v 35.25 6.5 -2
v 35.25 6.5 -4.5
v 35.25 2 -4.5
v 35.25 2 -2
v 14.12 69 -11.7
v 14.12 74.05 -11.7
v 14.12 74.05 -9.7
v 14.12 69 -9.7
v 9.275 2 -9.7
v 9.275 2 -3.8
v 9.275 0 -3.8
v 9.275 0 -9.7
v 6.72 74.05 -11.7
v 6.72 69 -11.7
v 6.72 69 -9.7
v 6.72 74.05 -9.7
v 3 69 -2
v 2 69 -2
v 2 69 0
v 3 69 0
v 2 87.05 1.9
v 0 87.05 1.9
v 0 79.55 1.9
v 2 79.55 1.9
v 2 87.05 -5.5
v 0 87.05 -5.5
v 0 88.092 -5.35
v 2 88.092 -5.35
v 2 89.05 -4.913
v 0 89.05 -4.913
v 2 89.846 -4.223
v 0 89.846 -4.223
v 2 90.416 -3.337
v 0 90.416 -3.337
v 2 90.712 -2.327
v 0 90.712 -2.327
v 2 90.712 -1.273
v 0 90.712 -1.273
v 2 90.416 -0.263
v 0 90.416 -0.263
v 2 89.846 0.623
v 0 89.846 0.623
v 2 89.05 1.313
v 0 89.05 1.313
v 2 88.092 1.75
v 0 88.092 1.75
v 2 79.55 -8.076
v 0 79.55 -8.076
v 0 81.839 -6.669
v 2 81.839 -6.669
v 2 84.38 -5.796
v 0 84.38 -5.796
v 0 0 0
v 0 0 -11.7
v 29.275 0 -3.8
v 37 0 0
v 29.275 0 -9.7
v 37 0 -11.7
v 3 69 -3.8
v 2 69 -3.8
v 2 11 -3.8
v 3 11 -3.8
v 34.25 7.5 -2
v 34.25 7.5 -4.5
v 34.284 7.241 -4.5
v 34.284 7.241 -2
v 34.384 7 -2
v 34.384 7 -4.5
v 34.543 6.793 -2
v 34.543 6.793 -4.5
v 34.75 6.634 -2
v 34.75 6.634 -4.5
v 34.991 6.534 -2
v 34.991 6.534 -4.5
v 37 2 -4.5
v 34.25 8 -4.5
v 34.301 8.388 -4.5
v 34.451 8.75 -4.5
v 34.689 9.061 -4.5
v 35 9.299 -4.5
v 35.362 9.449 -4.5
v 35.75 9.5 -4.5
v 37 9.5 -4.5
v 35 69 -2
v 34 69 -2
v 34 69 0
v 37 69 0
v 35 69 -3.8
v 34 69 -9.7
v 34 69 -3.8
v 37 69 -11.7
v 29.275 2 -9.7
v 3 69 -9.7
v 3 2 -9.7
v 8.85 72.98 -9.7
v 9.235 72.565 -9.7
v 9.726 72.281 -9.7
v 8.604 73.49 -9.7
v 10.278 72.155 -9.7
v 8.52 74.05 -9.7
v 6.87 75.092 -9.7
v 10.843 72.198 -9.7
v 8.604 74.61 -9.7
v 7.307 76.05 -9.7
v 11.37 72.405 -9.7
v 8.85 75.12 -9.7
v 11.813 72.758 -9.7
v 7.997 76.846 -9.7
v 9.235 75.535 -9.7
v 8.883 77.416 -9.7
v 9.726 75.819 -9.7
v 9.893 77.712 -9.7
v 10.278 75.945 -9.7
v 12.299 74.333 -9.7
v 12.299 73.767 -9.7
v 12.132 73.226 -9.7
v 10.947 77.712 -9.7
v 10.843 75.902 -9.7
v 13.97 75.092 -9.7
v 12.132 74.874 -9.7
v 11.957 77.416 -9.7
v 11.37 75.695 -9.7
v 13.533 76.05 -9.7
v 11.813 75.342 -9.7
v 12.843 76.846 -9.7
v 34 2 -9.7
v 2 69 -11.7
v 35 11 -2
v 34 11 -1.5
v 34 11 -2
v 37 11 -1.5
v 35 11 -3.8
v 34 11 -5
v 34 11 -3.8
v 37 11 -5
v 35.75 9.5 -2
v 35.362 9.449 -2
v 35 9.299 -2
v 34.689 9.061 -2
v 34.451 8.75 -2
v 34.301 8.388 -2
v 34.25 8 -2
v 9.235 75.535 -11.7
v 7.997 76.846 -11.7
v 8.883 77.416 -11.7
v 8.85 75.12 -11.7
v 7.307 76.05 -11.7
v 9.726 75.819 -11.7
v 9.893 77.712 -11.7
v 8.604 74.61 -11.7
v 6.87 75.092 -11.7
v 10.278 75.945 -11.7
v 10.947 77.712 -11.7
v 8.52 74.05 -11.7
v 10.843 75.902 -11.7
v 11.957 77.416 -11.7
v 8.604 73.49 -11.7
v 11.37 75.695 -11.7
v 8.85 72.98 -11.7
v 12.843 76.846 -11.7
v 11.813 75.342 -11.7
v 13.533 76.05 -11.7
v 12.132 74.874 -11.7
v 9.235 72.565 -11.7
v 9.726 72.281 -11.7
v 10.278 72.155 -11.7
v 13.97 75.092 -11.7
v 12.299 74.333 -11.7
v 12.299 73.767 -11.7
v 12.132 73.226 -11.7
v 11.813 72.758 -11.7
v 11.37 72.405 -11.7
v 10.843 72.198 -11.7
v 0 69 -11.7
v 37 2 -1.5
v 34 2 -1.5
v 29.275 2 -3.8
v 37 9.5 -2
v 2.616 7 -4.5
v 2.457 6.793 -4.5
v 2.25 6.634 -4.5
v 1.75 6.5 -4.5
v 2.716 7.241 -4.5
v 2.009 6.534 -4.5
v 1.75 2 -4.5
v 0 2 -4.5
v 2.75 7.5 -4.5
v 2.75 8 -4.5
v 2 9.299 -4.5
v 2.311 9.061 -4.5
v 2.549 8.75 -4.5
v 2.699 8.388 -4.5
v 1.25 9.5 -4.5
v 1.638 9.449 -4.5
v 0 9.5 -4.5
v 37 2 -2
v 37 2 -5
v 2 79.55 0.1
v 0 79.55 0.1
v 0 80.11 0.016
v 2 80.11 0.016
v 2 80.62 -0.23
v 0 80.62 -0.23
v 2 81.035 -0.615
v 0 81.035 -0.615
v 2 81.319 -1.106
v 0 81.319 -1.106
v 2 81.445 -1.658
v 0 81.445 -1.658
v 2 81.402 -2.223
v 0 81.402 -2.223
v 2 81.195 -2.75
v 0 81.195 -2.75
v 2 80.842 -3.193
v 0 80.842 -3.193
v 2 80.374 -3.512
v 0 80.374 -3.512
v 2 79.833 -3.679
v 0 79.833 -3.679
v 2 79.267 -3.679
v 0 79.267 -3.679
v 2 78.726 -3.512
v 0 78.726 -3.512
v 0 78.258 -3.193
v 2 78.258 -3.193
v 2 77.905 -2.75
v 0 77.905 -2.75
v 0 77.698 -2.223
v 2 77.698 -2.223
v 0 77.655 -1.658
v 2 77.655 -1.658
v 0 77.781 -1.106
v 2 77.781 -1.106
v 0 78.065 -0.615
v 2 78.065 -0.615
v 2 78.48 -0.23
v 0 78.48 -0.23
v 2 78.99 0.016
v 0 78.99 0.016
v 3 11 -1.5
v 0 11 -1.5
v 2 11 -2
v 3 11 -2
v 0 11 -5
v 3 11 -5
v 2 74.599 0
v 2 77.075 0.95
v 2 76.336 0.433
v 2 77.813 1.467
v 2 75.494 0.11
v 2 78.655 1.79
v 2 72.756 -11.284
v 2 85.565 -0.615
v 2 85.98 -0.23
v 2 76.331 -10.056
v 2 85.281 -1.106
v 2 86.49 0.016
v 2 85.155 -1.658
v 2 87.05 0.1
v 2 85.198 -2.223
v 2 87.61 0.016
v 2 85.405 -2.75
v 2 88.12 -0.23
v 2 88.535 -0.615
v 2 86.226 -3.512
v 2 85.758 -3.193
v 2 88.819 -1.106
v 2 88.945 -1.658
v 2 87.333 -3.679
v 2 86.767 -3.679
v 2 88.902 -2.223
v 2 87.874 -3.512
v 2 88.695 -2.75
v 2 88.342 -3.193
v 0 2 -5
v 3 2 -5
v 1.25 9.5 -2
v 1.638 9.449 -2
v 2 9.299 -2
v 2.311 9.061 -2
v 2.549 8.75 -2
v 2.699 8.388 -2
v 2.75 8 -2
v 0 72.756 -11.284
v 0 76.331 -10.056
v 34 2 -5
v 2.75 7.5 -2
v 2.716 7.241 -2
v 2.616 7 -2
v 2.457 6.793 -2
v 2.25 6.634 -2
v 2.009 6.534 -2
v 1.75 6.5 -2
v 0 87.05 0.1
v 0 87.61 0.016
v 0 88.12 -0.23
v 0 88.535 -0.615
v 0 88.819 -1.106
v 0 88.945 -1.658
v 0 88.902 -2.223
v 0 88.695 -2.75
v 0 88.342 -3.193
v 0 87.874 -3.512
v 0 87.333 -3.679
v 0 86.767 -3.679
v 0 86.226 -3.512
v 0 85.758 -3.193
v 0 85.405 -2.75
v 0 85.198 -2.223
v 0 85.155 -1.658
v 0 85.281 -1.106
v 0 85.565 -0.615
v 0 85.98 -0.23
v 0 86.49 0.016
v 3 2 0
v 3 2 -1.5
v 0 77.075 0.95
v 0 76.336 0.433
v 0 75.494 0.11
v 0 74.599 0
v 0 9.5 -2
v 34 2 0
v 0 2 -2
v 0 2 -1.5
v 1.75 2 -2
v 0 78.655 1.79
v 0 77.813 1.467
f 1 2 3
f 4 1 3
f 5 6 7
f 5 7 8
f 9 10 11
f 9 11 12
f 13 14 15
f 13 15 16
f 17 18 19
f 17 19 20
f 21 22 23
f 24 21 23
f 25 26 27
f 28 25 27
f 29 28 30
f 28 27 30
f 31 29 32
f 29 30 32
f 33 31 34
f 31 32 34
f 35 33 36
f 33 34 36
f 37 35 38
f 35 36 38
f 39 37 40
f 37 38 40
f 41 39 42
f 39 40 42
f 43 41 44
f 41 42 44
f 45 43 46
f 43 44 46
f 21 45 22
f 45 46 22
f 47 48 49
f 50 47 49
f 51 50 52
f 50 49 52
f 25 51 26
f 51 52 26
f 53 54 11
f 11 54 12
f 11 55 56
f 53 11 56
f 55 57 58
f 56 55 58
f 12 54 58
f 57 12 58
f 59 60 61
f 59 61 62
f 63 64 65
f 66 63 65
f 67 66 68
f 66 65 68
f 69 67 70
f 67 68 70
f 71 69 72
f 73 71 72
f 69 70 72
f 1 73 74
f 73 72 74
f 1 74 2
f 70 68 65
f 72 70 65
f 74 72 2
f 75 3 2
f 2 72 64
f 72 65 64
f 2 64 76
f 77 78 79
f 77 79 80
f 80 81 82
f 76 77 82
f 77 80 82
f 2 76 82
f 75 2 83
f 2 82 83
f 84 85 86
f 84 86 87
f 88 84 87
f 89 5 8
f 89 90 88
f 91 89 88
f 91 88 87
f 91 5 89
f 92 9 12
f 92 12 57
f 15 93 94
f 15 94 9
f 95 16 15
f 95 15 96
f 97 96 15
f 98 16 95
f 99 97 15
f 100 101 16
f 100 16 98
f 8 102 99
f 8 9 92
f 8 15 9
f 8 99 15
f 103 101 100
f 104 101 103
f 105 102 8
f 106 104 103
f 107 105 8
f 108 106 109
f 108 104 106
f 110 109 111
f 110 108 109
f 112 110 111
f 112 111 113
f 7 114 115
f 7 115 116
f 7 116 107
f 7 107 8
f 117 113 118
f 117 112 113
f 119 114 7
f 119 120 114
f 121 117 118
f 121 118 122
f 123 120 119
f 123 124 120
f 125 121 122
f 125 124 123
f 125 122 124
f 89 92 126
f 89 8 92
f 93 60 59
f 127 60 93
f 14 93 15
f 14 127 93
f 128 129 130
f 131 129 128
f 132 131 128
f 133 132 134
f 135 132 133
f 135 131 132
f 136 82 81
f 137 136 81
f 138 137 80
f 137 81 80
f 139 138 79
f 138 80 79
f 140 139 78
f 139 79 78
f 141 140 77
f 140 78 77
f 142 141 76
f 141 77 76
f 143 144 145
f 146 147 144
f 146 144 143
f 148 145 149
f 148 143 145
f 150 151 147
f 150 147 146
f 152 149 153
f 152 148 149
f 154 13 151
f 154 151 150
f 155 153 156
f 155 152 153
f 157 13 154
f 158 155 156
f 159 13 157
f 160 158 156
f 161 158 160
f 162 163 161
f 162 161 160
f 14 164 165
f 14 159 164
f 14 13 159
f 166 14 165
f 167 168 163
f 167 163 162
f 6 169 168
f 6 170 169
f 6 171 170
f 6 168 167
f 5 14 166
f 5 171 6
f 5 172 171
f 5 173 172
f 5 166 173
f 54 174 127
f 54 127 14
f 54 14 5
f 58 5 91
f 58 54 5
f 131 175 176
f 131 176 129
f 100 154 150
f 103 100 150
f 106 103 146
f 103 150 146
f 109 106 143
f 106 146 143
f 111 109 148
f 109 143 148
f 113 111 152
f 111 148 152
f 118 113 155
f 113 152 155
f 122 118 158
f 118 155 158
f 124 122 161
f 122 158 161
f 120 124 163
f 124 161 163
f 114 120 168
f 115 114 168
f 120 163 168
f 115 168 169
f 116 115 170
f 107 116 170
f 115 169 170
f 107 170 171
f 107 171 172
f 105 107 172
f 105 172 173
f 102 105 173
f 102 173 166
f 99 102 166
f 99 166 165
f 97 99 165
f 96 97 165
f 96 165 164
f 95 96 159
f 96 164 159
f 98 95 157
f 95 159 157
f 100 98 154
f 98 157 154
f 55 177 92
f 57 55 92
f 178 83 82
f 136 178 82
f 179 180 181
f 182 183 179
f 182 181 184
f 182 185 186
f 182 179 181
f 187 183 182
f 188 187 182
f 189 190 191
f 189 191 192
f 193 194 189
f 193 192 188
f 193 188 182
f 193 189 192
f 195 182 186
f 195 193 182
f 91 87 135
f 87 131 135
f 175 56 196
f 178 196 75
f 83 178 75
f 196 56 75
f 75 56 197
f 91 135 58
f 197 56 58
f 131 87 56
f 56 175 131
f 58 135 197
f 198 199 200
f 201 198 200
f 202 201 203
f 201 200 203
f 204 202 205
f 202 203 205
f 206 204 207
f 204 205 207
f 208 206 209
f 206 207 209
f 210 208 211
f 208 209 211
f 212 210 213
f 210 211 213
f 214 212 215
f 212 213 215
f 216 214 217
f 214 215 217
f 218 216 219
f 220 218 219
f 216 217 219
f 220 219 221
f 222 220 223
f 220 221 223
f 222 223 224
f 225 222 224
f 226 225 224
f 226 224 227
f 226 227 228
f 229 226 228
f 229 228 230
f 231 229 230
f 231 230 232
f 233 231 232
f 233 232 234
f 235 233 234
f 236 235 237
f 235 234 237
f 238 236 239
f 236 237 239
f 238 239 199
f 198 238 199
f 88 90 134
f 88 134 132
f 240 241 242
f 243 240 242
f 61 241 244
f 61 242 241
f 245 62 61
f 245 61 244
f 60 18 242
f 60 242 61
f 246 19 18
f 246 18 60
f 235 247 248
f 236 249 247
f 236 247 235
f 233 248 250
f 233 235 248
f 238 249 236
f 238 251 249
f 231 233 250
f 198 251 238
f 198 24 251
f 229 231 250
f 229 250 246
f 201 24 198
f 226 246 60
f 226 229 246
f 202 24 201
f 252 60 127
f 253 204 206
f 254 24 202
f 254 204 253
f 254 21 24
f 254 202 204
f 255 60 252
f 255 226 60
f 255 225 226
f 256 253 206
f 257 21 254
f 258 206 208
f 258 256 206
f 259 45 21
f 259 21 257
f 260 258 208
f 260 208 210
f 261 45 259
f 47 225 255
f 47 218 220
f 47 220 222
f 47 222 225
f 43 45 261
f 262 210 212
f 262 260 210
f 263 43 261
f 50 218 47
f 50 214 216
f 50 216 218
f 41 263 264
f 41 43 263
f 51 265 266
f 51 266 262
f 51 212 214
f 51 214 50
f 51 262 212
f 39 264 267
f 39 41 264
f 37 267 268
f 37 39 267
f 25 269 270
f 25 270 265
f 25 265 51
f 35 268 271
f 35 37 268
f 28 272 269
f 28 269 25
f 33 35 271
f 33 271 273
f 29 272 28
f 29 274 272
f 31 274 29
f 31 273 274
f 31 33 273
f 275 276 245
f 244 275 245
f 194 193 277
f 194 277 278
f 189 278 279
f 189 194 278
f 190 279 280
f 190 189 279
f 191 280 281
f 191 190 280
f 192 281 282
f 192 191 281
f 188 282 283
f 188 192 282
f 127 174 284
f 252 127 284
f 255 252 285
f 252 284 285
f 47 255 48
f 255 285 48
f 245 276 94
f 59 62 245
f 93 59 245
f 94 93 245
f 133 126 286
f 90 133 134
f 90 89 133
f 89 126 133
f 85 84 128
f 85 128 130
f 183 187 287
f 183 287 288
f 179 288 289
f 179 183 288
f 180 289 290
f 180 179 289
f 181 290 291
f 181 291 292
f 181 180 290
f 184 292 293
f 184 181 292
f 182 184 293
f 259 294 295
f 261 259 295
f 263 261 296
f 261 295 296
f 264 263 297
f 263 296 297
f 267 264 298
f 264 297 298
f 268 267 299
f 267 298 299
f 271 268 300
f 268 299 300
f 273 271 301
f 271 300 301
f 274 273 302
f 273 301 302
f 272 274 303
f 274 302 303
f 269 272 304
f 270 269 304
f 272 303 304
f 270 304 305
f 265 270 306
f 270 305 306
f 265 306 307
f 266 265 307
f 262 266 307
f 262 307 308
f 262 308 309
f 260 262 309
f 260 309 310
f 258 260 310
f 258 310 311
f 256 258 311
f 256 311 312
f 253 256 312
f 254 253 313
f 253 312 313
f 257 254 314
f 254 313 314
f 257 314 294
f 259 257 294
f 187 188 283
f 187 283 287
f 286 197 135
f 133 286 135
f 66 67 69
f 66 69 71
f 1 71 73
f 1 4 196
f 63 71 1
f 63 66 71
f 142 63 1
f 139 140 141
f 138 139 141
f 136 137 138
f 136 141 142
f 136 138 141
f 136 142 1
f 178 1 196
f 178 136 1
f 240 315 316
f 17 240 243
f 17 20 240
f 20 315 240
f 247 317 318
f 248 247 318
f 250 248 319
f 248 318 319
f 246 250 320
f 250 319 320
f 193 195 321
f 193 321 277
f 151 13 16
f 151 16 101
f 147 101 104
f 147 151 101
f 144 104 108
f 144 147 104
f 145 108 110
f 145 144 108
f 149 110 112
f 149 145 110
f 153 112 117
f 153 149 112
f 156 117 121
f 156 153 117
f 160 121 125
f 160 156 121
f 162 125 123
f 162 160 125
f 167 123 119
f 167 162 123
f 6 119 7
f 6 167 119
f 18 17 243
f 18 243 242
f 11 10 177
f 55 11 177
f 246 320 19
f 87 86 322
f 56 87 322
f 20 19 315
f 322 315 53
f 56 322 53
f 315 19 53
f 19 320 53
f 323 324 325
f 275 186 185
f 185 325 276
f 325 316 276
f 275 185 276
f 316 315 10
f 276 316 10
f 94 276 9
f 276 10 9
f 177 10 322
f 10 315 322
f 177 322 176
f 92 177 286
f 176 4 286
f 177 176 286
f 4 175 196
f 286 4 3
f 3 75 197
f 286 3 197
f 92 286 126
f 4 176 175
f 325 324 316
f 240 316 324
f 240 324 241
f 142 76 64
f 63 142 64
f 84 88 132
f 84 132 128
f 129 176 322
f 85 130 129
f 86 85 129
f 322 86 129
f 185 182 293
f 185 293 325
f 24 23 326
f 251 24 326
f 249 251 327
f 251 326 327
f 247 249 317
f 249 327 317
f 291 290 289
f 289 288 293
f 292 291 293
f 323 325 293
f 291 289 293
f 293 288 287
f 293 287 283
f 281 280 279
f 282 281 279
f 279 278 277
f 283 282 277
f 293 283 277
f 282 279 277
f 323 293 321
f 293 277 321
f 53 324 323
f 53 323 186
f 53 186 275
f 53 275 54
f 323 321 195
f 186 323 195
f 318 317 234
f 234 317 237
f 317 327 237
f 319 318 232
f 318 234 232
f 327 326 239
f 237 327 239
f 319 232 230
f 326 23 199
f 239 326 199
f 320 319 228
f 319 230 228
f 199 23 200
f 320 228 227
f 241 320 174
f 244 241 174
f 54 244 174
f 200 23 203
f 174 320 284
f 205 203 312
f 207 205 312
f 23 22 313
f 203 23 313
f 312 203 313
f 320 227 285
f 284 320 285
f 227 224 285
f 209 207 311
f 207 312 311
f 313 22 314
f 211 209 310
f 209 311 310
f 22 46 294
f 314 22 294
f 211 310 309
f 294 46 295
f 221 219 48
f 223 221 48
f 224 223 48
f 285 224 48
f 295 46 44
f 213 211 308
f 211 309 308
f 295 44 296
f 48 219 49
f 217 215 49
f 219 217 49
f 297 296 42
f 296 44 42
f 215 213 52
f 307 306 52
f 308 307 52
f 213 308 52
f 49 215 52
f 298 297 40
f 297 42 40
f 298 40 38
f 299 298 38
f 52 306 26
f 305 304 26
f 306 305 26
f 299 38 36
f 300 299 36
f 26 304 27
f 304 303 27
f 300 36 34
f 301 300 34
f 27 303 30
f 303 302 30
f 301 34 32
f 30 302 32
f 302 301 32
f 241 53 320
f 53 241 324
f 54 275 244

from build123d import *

# Parameters (mm, degrees)
SKETCH1_W           = 37
SKETCH1_H           = 11.7
BOSS_EXTRUDE1_DEPTH = 69
CUT_EXTRUDE1_DEPTH  = 67
SKETCH3_W           = 20
SKETCH3_H           = 5.9
CUT_EXTRUDE2_DEPTH  = 67
SKETCH5_R           = 1.9
BOSS_EXTRUDE3_DEPTH = 2
SKETCH7_R           = 1.9
BOSS_EXTRUDE4_DEPTH = 2
SKETCH8_W           = 3.5
SKETCH8_H           = 9
CUT_EXTRUDE3_DEPTH  = 40
BOSS_EXTRUDE5_START = 0.5
BOSS_EXTRUDE5_DEPTH = 2.5


with BuildPart() as part:
    # Sketch1 → Boss-Extrude1 (new body)
    with BuildSketch(Plane(origin=(0, 0, 0), x_dir=(1, 0, 0), z_dir=(0, 1, 0))):
        with Locations((18.5, 5.85)):
            Rectangle(SKETCH1_W, SKETCH1_H)
    extrude(amount=BOSS_EXTRUDE1_DEPTH)

    # Sketch2 → Cut-Extrude1 (cut)
    with BuildSketch(Plane(origin=(0, 69, 0), x_dir=(1, 0, 0), z_dir=(0, 1, 0))):
        Polygon((3, 0), (3, 2), (2, 2), (2, 3.8), (3, 3.8), (3, 9.7), (34, 9.7), (34, 3.8), (35, 3.8), (35, 2), (34, 2), (34, 0), align=None)
    extrude(amount=-CUT_EXTRUDE1_DEPTH, mode=Mode.SUBTRACT)

    # Sketch3 → Cut-Extrude2 (cut)
    with BuildSketch(Plane(origin=(0, 2, 0), x_dir=(1, 0, 0), z_dir=(0, 1, 0))):
        with Locations((19.275, 6.75)):
            Rectangle(SKETCH3_W, SKETCH3_H)
    extrude(amount=-CUT_EXTRUDE2_DEPTH, mode=Mode.SUBTRACT)

    # Sketch5 → Boss-Extrude3 (add)
    with BuildSketch(Plane(origin=(0, 0, -11.7), x_dir=(-1, 0, 0), z_dir=(0, 0, -1))):
        with BuildLine():
            Line((-14.12, 74.05), (-14.12, 69))
            Line((-14.12, 69), (-6.72, 69))
            Line((-6.72, 69), (-6.72, 74.05))
            ThreePointArc((-6.72, 74.05), (-10.42, 77.75), (-14.12, 74.05))
        make_face()
        with Locations((-10.42, 74.05)):
            Circle(SKETCH5_R, mode=Mode.SUBTRACT)
    extrude(amount=-BOSS_EXTRUDE3_DEPTH)

    # Sketch7 → Boss-Extrude4 (add)
    with BuildSketch(Plane.ZY):
        with BuildLine():
            Line((1.9, 87.05), (1.9, 79.55))
            ThreePointArc((1.9, 79.55), (1.65434509, 78.224292642), (0.95, 77.074621241))
            ThreePointArc((0.95, 77.074621241), (0.24565491, 75.924949841), (0, 74.599242482))
            Line((0, 74.599242482), (0, 69))
            Line((0, 69), (-11.7, 69))
            ThreePointArc((-11.7, 69), (-10.768790899, 74.577512686), (-8.076177285, 79.55))
            ThreePointArc((-8.076177285, 79.55), (-6.161996991, 83.084943588), (-5.5, 87.05))
            ThreePointArc((-5.5, 87.05), (-1.8, 90.75), (1.9, 87.05))
        make_face()
        with Locations((-1.8, 79.55)):
            Circle(SKETCH7_R, mode=Mode.SUBTRACT)
        with Locations((-1.8, 87.05)):
            Circle(SKETCH7_R, mode=Mode.SUBTRACT)
    extrude(amount=-BOSS_EXTRUDE4_DEPTH)

    # Sketch8 → Cut-Extrude3 (cut)
    with BuildSketch(Plane(origin=(37, 0, 0), x_dir=(0, 0, -1), z_dir=(1, 0, 0))):
        with Locations((3.25, 6.5)):
            Rectangle(SKETCH8_W, SKETCH8_H)
    extrude(amount=-CUT_EXTRUDE3_DEPTH, mode=Mode.SUBTRACT)

    # Sketch9 → Boss-Extrude5 (add)
    with BuildSketch(Plane.XY.offset(-5).offset(BOSS_EXTRUDE5_START)):
        with BuildLine():
            Line((37, 2), (37, 9.5))
            Line((37, 9.5), (35.75, 9.5))
            ThreePointArc((35.75, 9.5), (34.689339828, 9.060660172), (34.25, 8))
            Line((34.25, 8), (34.25, 7.5))
            ThreePointArc((34.25, 7.5), (34.542893219, 6.792893219), (35.25, 6.5))
            Line((35.25, 6.5), (35.25, 2))
            Line((35.25, 2), (37, 2))
        make_face()
    boss_extrude5 = extrude(amount=BOSS_EXTRUDE5_DEPTH)

    # Mirror1: Boss-Extrude5 across plane
    add(boss_extrude5.mirror(Plane(origin=(18.5, 0, 0), x_dir=(0, 0, 1), z_dir=(1, 0, 0))))


solid = part.part
